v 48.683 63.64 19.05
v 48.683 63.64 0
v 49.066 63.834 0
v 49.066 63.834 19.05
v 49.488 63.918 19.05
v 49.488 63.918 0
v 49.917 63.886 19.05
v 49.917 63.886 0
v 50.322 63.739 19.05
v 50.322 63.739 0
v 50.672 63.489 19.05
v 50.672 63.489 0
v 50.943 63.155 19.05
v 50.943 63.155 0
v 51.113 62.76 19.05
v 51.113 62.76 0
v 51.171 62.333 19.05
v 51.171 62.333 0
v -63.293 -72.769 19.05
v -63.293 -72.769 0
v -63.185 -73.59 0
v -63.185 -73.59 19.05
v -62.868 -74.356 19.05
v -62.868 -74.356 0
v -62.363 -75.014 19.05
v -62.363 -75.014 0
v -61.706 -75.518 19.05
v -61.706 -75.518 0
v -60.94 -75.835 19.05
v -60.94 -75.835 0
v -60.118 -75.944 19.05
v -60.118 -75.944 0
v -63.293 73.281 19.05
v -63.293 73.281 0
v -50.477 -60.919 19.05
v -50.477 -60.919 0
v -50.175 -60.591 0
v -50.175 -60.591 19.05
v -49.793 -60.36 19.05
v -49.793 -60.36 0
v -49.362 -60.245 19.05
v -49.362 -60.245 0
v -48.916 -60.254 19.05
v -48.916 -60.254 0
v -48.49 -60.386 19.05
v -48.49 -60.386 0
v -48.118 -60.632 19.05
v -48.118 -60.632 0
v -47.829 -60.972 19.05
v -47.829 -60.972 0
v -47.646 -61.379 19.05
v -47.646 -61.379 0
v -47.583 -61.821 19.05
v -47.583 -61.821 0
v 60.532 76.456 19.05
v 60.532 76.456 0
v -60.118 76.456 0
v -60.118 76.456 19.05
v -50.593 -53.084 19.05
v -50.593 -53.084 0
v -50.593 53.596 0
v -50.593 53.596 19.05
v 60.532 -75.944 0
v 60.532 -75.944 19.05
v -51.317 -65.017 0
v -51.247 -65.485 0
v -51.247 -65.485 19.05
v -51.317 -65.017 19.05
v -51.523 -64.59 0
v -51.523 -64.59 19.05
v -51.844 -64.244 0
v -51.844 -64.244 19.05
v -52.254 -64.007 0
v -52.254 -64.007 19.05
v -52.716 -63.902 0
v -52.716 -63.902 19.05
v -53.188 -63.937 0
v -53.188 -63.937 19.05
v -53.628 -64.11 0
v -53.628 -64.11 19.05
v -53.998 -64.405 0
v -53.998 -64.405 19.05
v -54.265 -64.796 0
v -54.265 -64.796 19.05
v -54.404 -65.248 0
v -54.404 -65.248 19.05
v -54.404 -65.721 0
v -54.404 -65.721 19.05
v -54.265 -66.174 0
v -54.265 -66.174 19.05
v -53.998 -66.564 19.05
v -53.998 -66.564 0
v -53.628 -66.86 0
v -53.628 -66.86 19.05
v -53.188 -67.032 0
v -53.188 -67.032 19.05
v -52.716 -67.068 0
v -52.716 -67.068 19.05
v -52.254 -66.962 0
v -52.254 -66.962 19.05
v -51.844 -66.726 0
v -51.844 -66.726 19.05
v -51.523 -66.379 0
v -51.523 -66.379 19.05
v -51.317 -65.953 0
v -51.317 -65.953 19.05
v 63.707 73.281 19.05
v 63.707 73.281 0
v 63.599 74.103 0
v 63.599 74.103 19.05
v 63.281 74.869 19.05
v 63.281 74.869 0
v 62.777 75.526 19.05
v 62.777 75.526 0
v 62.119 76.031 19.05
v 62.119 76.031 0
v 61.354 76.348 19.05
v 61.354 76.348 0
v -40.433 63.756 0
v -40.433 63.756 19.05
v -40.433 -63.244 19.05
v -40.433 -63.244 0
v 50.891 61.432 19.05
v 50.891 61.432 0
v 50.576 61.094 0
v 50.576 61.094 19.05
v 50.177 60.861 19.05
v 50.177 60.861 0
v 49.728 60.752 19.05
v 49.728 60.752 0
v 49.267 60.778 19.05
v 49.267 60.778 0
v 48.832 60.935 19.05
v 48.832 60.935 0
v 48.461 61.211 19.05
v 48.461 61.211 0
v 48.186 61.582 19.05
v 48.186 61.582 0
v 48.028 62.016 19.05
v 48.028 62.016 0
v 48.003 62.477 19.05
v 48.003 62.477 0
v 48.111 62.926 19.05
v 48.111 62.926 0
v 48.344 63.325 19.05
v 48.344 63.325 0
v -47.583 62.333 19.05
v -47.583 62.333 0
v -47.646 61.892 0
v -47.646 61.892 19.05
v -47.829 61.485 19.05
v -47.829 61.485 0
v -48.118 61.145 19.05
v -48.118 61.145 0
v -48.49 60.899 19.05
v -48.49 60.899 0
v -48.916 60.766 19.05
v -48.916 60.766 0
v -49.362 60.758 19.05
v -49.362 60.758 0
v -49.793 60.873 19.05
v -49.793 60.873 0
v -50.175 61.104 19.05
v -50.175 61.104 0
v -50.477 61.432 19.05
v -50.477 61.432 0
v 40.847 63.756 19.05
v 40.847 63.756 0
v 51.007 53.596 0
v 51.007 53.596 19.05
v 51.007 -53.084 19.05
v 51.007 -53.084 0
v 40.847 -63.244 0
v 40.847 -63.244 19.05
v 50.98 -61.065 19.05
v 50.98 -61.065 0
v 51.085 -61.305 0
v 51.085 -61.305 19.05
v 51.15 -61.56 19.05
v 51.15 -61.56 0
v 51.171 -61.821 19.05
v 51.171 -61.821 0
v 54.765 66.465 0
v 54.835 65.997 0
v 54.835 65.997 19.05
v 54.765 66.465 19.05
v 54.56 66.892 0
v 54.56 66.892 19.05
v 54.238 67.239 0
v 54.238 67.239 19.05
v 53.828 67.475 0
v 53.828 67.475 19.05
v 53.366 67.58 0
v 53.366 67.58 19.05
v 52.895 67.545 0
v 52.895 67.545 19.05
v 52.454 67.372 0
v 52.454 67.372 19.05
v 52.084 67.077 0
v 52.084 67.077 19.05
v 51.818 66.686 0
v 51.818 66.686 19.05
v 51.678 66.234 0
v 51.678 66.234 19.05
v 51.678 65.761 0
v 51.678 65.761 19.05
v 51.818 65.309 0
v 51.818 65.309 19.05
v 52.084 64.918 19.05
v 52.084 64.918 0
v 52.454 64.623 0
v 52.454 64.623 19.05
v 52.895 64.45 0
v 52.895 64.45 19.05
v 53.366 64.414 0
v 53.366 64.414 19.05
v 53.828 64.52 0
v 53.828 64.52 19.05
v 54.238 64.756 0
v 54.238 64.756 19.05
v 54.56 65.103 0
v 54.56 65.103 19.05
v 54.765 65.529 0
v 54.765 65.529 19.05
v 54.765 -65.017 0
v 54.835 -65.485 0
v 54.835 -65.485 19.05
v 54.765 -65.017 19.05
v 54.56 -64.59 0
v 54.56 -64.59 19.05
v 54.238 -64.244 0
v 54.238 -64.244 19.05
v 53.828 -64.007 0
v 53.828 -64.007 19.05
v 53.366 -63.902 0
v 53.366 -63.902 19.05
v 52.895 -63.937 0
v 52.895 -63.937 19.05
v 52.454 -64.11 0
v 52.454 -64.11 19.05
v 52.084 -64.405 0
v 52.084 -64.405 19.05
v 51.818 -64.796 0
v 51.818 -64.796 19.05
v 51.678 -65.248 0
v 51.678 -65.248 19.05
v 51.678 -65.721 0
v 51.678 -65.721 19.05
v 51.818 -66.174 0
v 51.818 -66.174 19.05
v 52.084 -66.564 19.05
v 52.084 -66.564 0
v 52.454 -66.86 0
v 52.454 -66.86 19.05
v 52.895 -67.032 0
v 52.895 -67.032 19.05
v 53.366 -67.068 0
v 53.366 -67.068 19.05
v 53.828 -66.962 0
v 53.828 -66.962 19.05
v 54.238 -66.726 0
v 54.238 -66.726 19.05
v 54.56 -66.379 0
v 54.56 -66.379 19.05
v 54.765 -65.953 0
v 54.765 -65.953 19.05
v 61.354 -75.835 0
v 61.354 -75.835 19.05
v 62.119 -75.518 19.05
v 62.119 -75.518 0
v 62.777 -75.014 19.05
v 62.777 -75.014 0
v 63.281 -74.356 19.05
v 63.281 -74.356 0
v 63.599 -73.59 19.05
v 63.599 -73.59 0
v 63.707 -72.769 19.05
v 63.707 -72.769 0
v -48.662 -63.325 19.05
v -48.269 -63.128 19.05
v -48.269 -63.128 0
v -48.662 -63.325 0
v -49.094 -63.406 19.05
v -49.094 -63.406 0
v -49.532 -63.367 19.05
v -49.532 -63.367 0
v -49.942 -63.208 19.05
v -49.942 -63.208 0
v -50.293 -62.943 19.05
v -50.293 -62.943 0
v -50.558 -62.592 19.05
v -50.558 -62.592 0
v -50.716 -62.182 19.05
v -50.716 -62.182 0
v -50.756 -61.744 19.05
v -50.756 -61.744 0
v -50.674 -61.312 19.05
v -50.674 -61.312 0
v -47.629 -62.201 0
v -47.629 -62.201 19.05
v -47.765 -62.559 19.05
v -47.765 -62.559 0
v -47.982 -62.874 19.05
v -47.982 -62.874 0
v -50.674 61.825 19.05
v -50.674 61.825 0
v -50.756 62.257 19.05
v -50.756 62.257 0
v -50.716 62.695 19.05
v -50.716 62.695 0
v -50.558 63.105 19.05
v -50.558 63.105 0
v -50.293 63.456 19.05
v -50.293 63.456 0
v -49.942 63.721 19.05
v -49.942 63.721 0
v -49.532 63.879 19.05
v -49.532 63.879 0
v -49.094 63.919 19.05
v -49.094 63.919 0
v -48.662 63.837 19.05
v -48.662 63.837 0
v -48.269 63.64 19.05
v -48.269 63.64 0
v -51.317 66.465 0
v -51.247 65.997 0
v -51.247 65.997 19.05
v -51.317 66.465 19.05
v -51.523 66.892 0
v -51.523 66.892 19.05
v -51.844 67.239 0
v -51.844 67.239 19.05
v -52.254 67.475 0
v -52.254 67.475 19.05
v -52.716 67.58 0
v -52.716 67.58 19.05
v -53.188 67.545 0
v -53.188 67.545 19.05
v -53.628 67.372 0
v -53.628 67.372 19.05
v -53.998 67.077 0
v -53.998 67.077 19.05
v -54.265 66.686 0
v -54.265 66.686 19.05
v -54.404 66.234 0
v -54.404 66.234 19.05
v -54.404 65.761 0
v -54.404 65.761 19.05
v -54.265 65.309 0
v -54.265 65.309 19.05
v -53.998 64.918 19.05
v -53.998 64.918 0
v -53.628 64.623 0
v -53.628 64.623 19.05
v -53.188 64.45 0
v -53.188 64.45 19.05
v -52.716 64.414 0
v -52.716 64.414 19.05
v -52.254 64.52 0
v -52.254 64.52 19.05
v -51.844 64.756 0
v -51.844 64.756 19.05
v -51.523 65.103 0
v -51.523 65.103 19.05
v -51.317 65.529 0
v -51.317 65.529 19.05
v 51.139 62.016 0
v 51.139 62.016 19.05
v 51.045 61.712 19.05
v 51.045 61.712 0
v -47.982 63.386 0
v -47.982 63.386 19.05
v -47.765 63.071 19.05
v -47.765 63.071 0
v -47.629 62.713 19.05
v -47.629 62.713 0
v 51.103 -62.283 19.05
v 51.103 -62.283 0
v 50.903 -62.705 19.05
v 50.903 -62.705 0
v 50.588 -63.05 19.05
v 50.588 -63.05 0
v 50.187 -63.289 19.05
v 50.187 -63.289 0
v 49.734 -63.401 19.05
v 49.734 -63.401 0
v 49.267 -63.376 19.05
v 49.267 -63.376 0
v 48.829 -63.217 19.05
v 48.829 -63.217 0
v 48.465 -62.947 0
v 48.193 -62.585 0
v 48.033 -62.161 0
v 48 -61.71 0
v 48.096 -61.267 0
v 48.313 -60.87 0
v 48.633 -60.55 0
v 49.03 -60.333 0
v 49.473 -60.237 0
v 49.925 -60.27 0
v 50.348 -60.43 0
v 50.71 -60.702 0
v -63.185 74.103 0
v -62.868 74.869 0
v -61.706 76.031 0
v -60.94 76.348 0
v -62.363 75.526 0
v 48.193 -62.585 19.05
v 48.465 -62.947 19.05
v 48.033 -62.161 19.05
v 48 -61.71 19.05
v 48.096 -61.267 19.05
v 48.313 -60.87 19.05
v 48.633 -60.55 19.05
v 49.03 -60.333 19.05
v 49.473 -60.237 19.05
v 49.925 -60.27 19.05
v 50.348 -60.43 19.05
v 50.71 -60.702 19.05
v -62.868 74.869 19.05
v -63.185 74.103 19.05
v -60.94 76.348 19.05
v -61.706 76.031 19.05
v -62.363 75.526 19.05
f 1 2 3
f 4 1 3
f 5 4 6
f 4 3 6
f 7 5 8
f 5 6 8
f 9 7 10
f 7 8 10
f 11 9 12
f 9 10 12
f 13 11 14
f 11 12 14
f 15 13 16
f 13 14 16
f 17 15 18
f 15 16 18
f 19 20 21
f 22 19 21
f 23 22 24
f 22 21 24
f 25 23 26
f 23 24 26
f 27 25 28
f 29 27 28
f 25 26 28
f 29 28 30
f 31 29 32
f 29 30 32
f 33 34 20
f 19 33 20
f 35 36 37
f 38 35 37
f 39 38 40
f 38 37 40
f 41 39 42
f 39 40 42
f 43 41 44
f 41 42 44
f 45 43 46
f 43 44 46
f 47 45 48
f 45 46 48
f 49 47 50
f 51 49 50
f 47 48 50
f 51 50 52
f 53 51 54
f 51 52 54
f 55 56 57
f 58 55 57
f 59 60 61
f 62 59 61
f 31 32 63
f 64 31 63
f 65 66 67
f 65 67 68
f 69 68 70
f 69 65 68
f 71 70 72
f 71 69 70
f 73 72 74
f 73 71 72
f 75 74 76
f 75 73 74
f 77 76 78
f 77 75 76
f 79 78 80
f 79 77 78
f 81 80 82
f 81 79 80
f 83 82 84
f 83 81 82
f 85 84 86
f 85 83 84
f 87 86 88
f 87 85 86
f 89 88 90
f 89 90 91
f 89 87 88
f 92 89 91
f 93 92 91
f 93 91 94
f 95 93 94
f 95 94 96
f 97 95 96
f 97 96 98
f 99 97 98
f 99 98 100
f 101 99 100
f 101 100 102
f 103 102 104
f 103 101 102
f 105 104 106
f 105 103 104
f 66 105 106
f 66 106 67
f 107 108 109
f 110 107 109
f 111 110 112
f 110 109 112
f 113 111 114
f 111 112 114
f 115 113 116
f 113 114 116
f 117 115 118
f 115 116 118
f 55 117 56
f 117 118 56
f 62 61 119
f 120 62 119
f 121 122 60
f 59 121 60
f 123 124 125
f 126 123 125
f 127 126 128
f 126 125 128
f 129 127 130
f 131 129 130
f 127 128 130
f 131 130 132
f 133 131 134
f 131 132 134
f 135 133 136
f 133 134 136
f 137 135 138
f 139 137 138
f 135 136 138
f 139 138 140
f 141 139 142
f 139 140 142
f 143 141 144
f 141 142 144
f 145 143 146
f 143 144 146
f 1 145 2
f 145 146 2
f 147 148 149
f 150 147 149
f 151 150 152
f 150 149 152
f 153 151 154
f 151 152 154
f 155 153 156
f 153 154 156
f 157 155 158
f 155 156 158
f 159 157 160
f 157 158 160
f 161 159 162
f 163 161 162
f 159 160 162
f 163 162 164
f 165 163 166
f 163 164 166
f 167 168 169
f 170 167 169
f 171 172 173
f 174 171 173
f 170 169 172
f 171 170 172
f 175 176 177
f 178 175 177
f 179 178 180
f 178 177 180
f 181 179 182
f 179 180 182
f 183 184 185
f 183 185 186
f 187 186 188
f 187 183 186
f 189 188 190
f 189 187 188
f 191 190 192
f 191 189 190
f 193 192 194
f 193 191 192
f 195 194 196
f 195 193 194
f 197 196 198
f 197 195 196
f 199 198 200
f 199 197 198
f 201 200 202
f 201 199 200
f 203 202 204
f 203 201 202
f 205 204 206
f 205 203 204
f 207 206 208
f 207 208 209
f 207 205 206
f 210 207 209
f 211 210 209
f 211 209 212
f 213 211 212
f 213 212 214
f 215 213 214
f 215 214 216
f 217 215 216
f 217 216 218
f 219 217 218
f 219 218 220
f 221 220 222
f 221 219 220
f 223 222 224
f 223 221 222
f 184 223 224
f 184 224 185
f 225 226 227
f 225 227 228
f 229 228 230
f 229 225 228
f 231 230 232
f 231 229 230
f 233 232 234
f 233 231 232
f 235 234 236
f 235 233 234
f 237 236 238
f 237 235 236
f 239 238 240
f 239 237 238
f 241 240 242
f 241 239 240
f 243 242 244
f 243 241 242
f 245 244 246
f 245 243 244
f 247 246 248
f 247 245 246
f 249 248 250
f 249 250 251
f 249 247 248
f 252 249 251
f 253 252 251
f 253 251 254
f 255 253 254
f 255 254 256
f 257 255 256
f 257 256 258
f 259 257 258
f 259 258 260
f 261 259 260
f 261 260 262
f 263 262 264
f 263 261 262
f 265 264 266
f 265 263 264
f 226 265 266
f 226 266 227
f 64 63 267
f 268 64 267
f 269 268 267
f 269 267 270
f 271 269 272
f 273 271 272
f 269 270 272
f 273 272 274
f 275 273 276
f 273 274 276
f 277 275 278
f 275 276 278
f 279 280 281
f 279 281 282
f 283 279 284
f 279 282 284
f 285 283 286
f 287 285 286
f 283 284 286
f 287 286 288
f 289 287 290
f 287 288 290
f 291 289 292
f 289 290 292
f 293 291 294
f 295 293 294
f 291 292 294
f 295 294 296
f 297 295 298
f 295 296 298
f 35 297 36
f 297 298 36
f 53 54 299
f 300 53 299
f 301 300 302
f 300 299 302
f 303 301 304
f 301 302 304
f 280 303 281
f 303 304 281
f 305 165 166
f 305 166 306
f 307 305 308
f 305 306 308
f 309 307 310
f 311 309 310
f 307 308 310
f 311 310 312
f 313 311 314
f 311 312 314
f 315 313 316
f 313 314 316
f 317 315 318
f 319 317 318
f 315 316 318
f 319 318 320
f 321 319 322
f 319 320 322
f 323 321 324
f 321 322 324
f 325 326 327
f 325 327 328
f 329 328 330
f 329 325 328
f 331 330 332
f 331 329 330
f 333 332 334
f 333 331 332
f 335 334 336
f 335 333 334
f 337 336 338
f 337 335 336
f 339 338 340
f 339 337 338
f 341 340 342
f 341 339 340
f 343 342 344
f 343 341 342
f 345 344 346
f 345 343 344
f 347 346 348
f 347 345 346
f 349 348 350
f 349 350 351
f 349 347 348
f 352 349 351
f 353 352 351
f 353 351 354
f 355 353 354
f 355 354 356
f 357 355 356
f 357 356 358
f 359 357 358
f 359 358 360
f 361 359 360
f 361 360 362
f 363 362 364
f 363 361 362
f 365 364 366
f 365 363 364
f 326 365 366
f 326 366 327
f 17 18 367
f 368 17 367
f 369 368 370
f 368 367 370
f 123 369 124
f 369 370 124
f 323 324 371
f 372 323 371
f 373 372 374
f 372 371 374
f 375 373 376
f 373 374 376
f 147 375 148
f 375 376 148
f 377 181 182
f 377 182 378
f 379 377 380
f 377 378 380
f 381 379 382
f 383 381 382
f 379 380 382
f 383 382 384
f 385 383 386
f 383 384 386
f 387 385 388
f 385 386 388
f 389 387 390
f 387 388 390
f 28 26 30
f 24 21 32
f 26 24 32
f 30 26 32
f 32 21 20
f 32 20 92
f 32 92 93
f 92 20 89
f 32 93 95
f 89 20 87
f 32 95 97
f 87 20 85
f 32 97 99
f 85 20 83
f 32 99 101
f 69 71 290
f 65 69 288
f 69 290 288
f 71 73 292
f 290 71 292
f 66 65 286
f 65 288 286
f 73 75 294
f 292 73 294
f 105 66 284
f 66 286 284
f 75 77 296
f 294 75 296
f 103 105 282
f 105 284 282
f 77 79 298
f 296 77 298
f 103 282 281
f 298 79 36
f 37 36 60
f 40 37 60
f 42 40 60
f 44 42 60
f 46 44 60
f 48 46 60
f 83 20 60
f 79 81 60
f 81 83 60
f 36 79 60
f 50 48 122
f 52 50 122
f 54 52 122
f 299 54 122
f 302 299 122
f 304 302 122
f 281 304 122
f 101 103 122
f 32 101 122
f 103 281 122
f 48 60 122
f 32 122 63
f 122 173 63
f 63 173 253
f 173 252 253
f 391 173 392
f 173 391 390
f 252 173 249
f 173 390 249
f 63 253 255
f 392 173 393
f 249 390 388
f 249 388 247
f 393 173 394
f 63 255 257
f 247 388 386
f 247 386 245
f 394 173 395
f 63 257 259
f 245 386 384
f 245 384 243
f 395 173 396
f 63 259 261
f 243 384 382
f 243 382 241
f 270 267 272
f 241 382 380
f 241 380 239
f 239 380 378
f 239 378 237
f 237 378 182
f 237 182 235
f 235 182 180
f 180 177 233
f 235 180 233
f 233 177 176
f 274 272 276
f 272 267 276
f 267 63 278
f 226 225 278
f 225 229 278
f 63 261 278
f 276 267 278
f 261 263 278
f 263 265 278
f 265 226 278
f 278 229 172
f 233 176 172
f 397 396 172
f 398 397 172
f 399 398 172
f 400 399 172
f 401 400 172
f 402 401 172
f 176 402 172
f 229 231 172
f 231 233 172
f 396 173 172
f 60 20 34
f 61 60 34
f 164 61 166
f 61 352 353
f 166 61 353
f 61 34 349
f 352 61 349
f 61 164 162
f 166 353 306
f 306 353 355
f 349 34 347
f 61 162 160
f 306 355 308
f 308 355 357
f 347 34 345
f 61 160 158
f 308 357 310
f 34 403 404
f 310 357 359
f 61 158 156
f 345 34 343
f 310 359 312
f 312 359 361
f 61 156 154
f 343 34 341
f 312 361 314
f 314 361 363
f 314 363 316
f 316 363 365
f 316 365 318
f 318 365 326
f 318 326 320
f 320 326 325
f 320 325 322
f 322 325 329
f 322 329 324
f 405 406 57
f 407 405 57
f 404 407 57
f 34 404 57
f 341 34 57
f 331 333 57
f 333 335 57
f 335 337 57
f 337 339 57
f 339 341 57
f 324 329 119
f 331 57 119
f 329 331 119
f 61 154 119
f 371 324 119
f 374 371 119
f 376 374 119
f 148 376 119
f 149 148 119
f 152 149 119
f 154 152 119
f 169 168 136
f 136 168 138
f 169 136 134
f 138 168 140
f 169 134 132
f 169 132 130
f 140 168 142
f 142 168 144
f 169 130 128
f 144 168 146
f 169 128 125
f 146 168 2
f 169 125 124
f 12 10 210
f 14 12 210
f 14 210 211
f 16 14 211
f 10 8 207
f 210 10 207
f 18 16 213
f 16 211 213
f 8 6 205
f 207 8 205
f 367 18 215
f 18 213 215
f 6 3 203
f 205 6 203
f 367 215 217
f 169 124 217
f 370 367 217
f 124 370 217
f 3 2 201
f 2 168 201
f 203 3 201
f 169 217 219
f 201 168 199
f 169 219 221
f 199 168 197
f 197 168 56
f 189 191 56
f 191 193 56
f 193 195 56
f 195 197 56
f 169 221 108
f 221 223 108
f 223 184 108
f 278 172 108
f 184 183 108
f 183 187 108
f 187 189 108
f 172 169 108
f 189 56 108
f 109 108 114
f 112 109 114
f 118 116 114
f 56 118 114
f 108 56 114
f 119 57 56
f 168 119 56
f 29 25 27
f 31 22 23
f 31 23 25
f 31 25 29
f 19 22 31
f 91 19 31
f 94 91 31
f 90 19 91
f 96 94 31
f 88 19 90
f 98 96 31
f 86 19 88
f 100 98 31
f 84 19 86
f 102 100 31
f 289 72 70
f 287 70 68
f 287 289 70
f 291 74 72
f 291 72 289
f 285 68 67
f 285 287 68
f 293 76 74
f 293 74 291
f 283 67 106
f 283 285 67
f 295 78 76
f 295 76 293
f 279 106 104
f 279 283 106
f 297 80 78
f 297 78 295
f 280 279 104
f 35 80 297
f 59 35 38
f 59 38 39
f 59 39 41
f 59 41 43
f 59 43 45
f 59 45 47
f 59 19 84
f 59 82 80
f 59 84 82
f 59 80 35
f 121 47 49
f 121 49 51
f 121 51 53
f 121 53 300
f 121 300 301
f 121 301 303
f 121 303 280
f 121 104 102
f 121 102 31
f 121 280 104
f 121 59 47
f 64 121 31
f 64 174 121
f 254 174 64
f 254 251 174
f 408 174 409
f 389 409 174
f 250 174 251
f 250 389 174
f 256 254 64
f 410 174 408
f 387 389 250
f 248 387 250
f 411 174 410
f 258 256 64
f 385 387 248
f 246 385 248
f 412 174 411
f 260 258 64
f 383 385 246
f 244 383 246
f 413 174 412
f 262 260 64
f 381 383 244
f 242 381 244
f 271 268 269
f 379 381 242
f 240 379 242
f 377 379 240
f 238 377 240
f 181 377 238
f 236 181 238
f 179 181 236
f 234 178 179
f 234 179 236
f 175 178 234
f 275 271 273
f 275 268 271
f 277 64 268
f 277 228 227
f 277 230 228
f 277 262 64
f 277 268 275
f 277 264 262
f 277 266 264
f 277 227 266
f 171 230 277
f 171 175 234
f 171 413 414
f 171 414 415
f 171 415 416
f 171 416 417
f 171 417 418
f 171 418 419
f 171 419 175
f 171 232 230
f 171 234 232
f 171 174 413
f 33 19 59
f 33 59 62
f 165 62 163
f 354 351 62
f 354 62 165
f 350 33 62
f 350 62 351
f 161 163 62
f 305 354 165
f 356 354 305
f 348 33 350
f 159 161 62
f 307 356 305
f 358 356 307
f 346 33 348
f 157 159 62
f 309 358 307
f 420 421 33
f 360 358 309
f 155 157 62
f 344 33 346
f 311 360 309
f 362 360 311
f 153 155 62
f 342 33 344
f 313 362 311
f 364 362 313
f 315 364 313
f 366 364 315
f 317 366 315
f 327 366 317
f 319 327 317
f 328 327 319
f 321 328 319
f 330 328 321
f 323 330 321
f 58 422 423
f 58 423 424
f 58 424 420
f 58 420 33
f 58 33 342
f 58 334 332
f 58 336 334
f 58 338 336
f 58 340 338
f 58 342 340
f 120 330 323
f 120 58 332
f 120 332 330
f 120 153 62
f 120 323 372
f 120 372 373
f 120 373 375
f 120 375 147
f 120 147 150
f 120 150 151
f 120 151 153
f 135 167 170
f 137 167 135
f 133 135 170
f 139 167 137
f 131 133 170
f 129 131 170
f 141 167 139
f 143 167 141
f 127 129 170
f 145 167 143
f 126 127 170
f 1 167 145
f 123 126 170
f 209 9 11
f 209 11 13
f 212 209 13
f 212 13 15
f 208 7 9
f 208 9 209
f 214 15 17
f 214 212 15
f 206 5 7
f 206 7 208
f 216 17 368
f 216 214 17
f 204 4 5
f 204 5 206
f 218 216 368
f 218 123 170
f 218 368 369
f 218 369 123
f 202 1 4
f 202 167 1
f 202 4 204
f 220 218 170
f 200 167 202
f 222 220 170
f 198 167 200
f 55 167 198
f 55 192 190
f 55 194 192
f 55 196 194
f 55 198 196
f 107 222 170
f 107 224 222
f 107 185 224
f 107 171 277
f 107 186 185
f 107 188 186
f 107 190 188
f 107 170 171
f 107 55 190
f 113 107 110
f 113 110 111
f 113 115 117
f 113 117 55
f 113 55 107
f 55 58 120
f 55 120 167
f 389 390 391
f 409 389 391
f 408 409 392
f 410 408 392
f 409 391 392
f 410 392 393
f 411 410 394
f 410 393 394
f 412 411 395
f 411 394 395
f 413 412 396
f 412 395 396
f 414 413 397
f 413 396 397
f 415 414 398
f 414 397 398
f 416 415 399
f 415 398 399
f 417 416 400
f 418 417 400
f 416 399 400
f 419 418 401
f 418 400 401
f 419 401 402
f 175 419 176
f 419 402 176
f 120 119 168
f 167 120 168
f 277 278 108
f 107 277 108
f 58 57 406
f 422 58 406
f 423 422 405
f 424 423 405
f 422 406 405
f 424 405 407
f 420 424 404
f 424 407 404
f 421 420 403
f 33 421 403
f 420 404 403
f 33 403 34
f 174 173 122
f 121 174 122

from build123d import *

# Parameters (mm, degrees)
F0_R     = 1.5875
F1_DEPTH = 19.05


with BuildPart() as f1:
    # F0 (on Top) → F1 (new body)
    with BuildSketch(Plane.XY):
        with BuildLine():
            Line((60.531797, 76.456334), (-60.118203, 76.456334))
            ThreePointArc((-60.118203, 76.456334), (-62.363267, 75.526399), (-63.293203, 73.281334))
            Line((-63.293203, 73.281334), (-63.293203, -72.768666))
            ThreePointArc((-63.293203, -72.768666), (-62.363267, -75.01373), (-60.118203, -75.943666))
            Line((-60.118203, -75.943666), (60.531797, -75.943666))
            ThreePointArc((60.531797, -75.943666), (62.776861, -75.01373), (63.706797, -72.768666))
            Line((63.706797, -72.768666), (63.706797, 73.281334))
            ThreePointArc((63.706797, 73.281334), (62.776861, 75.526399), (60.531797, 76.456334))
        make_face()
        with BuildLine():
            ThreePointArc((-56.943203, 66.931334), (-56.013267, 69.176399), (-53.768203, 70.106334))
            Line((-53.768203, 70.106334), (54.181797, 70.106334))
            ThreePointArc((54.181797, 70.106334), (56.426861, 69.176399), (57.356797, 66.931334))
            Line((57.356797, 66.931334), (57.356797, -66.418666))
            ThreePointArc((57.356797, -66.418666), (56.426861, -68.66373), (54.181797, -69.593666))
            Line((54.181797, -69.593666), (-53.768203, -69.593666))
            ThreePointArc((-53.768203, -69.593666), (-56.013267, -68.66373), (-56.943203, -66.418666))
            Line((-56.943203, -66.418666), (-56.943203, 66.931334))
        make_face(mode=Mode.SUBTRACT)
        with BuildLine():
            Line((54.181797, 70.106334), (-53.768203, 70.106334))
            ThreePointArc((-53.768203, 70.106334), (-56.013267, 69.176399), (-56.943203, 66.931334))
            Line((-56.943203, 66.931334), (-56.943203, -66.418666))
            ThreePointArc((-56.943203, -66.418666), (-56.013267, -68.66373), (-53.768203, -69.593666))
            Line((-53.768203, -69.593666), (54.181797, -69.593666))
            ThreePointArc((54.181797, -69.593666), (56.426861, -68.66373), (57.356797, -66.418666))
            Line((57.356797, -66.418666), (57.356797, 66.931334))
            ThreePointArc((57.356797, 66.931334), (56.426861, 69.176399), (54.181797, 70.106334))
        make_face()
        with Locations((-52.834257, -65.484719)):
            Circle(F0_R, mode=Mode.SUBTRACT)
        with BuildLine():
            ThreePointArc((-48.268948, 63.640233), (-47.847518, 63.727175), (-47.418203, 63.756334))
            Line((-47.418203, 63.756334), (-40.433203, 63.756334))
            Line((-40.433203, 63.756334), (40.846797, 63.756334))
            Line((40.846797, 63.756334), (47.831797, 63.756334))
            ThreePointArc((47.831797, 63.756334), (48.261112, 63.727175), (48.682541, 63.640233))
            ThreePointArc((48.682541, 63.640233), (50.321889, 63.738981), (51.171406, 62.333443))
            ThreePointArc((51.171406, 62.333443), (51.099604, 61.861412), (50.890695, 61.432079))
            ThreePointArc((50.890695, 61.432079), (50.977637, 61.01065), (51.006797, 60.581334))
            Line((51.006797, 60.581334), (51.006797, 53.596334))
            Line((51.006797, 53.596334), (51.006797, -53.083666))
            Line((51.006797, -53.083666), (51.006797, -60.698242))
            ThreePointArc((51.006797, -60.698242), (51.000133, -60.882306), (50.980177, -61.065405))
            ThreePointArc((50.980177, -61.065405), (51.122856, -61.431175), (51.171406, -61.820774))
            ThreePointArc((51.171406, -61.820774), (50.39662, -63.184465), (48.828536, -63.217046))
            ThreePointArc((48.828536, -63.217046), (48.645437, -63.237002), (48.461374, -63.243666))
            Line((48.461374, -63.243666), (40.846797, -63.243666))
            Line((40.846797, -63.243666), (-40.433203, -63.243666))
            Line((-40.433203, -63.243666), (-47.418203, -63.243666))
            ThreePointArc((-47.418203, -63.243666), (-47.847518, -63.214506), (-48.268948, -63.127564))
            ThreePointArc((-48.268948, -63.127564), (-50.292844, -62.943306), (-50.477102, -60.91941))
            ThreePointArc((-50.477102, -60.91941), (-50.564044, -60.497981), (-50.593203, -60.068666))
            Line((-50.593203, -60.068666), (-50.593203, -53.083666))
            Line((-50.593203, -53.083666), (-50.593203, 53.596334))
            Line((-50.593203, 53.596334), (-50.593203, 60.581334))
            ThreePointArc((-50.593203, 60.581334), (-50.564044, 61.01065), (-50.477102, 61.432079))
            ThreePointArc((-50.477102, 61.432079), (-50.292844, 63.455975), (-48.268948, 63.640233))
        make_face(mode=Mode.SUBTRACT)
        with Locations((53.24785, -65.484719)):
            Circle(F0_R, mode=Mode.SUBTRACT)
        with Locations((-52.834257, 65.997388)):
            Circle(F0_R, mode=Mode.SUBTRACT)
        with Locations((53.24785, 65.997388)):
            Circle(F0_R, mode=Mode.SUBTRACT)
        with BuildLine():
            Line((-40.433203, 63.756334), (-47.418203, 63.756334))
            ThreePointArc((-47.418203, 63.756334), (-47.847518, 63.727175), (-48.268948, 63.640233))
            ThreePointArc((-48.268948, 63.640233), (-47.764774, 63.071427), (-47.582812, 62.333443))
            ThreePointArc((-47.582812, 62.333443), (-48.69828, 60.817745), (-50.477102, 61.432079))
            ThreePointArc((-50.477102, 61.432079), (-50.564044, 61.01065), (-50.593203, 60.581334))
            Line((-50.593203, 60.581334), (-50.593203, 53.596334))
            Line((-50.593203, 53.596334), (-40.433203, 63.756334))
        make_face()
        with BuildLine():
            Line((47.831797, 63.756334), (40.846797, 63.756334))
            Line((40.846797, 63.756334), (51.006797, 53.596334))
            Line((51.006797, 53.596334), (51.006797, 60.581334))
            ThreePointArc((51.006797, 60.581334), (50.977637, 61.01065), (50.890695, 61.432079))
            ThreePointArc((50.890695, 61.432079), (48.461374, 61.210911), (48.682541, 63.640233))
            ThreePointArc((48.682541, 63.640233), (48.261112, 63.727175), (47.831797, 63.756334))
        make_face()
        with BuildLine():
            Line((51.006797, -60.698242), (51.006797, -53.083666))
            Line((51.006797, -53.083666), (40.846797, -63.243666))
            Line((40.846797, -63.243666), (48.461374, -63.243666))
            ThreePointArc((48.461374, -63.243666), (48.645437, -63.237002), (48.828536, -63.217046))
            ThreePointArc((48.828536, -63.217046), (48.461374, -60.698242), (50.980177, -61.065405))
            ThreePointArc((50.980177, -61.065405), (51.000133, -60.882306), (51.006797, -60.698242))
        make_face()
        with BuildLine():
            Line((-40.433203, -63.243666), (-50.593203, -53.083666))
            Line((-50.593203, -53.083666), (-50.593203, -60.068666))
            ThreePointArc((-50.593203, -60.068666), (-50.564044, -60.497981), (-50.477102, -60.91941))
            ThreePointArc((-50.477102, -60.91941), (-48.69828, -60.305076), (-47.582812, -61.820774))
            ThreePointArc((-47.582812, -61.820774), (-47.764774, -62.558758), (-48.268948, -63.127564))
            ThreePointArc((-48.268948, -63.127564), (-47.847518, -63.214506), (-47.418203, -63.243666))
            Line((-47.418203, -63.243666), (-40.433203, -63.243666))
        make_face()
    extrude(amount=F1_DEPTH)


solid = f1.part
